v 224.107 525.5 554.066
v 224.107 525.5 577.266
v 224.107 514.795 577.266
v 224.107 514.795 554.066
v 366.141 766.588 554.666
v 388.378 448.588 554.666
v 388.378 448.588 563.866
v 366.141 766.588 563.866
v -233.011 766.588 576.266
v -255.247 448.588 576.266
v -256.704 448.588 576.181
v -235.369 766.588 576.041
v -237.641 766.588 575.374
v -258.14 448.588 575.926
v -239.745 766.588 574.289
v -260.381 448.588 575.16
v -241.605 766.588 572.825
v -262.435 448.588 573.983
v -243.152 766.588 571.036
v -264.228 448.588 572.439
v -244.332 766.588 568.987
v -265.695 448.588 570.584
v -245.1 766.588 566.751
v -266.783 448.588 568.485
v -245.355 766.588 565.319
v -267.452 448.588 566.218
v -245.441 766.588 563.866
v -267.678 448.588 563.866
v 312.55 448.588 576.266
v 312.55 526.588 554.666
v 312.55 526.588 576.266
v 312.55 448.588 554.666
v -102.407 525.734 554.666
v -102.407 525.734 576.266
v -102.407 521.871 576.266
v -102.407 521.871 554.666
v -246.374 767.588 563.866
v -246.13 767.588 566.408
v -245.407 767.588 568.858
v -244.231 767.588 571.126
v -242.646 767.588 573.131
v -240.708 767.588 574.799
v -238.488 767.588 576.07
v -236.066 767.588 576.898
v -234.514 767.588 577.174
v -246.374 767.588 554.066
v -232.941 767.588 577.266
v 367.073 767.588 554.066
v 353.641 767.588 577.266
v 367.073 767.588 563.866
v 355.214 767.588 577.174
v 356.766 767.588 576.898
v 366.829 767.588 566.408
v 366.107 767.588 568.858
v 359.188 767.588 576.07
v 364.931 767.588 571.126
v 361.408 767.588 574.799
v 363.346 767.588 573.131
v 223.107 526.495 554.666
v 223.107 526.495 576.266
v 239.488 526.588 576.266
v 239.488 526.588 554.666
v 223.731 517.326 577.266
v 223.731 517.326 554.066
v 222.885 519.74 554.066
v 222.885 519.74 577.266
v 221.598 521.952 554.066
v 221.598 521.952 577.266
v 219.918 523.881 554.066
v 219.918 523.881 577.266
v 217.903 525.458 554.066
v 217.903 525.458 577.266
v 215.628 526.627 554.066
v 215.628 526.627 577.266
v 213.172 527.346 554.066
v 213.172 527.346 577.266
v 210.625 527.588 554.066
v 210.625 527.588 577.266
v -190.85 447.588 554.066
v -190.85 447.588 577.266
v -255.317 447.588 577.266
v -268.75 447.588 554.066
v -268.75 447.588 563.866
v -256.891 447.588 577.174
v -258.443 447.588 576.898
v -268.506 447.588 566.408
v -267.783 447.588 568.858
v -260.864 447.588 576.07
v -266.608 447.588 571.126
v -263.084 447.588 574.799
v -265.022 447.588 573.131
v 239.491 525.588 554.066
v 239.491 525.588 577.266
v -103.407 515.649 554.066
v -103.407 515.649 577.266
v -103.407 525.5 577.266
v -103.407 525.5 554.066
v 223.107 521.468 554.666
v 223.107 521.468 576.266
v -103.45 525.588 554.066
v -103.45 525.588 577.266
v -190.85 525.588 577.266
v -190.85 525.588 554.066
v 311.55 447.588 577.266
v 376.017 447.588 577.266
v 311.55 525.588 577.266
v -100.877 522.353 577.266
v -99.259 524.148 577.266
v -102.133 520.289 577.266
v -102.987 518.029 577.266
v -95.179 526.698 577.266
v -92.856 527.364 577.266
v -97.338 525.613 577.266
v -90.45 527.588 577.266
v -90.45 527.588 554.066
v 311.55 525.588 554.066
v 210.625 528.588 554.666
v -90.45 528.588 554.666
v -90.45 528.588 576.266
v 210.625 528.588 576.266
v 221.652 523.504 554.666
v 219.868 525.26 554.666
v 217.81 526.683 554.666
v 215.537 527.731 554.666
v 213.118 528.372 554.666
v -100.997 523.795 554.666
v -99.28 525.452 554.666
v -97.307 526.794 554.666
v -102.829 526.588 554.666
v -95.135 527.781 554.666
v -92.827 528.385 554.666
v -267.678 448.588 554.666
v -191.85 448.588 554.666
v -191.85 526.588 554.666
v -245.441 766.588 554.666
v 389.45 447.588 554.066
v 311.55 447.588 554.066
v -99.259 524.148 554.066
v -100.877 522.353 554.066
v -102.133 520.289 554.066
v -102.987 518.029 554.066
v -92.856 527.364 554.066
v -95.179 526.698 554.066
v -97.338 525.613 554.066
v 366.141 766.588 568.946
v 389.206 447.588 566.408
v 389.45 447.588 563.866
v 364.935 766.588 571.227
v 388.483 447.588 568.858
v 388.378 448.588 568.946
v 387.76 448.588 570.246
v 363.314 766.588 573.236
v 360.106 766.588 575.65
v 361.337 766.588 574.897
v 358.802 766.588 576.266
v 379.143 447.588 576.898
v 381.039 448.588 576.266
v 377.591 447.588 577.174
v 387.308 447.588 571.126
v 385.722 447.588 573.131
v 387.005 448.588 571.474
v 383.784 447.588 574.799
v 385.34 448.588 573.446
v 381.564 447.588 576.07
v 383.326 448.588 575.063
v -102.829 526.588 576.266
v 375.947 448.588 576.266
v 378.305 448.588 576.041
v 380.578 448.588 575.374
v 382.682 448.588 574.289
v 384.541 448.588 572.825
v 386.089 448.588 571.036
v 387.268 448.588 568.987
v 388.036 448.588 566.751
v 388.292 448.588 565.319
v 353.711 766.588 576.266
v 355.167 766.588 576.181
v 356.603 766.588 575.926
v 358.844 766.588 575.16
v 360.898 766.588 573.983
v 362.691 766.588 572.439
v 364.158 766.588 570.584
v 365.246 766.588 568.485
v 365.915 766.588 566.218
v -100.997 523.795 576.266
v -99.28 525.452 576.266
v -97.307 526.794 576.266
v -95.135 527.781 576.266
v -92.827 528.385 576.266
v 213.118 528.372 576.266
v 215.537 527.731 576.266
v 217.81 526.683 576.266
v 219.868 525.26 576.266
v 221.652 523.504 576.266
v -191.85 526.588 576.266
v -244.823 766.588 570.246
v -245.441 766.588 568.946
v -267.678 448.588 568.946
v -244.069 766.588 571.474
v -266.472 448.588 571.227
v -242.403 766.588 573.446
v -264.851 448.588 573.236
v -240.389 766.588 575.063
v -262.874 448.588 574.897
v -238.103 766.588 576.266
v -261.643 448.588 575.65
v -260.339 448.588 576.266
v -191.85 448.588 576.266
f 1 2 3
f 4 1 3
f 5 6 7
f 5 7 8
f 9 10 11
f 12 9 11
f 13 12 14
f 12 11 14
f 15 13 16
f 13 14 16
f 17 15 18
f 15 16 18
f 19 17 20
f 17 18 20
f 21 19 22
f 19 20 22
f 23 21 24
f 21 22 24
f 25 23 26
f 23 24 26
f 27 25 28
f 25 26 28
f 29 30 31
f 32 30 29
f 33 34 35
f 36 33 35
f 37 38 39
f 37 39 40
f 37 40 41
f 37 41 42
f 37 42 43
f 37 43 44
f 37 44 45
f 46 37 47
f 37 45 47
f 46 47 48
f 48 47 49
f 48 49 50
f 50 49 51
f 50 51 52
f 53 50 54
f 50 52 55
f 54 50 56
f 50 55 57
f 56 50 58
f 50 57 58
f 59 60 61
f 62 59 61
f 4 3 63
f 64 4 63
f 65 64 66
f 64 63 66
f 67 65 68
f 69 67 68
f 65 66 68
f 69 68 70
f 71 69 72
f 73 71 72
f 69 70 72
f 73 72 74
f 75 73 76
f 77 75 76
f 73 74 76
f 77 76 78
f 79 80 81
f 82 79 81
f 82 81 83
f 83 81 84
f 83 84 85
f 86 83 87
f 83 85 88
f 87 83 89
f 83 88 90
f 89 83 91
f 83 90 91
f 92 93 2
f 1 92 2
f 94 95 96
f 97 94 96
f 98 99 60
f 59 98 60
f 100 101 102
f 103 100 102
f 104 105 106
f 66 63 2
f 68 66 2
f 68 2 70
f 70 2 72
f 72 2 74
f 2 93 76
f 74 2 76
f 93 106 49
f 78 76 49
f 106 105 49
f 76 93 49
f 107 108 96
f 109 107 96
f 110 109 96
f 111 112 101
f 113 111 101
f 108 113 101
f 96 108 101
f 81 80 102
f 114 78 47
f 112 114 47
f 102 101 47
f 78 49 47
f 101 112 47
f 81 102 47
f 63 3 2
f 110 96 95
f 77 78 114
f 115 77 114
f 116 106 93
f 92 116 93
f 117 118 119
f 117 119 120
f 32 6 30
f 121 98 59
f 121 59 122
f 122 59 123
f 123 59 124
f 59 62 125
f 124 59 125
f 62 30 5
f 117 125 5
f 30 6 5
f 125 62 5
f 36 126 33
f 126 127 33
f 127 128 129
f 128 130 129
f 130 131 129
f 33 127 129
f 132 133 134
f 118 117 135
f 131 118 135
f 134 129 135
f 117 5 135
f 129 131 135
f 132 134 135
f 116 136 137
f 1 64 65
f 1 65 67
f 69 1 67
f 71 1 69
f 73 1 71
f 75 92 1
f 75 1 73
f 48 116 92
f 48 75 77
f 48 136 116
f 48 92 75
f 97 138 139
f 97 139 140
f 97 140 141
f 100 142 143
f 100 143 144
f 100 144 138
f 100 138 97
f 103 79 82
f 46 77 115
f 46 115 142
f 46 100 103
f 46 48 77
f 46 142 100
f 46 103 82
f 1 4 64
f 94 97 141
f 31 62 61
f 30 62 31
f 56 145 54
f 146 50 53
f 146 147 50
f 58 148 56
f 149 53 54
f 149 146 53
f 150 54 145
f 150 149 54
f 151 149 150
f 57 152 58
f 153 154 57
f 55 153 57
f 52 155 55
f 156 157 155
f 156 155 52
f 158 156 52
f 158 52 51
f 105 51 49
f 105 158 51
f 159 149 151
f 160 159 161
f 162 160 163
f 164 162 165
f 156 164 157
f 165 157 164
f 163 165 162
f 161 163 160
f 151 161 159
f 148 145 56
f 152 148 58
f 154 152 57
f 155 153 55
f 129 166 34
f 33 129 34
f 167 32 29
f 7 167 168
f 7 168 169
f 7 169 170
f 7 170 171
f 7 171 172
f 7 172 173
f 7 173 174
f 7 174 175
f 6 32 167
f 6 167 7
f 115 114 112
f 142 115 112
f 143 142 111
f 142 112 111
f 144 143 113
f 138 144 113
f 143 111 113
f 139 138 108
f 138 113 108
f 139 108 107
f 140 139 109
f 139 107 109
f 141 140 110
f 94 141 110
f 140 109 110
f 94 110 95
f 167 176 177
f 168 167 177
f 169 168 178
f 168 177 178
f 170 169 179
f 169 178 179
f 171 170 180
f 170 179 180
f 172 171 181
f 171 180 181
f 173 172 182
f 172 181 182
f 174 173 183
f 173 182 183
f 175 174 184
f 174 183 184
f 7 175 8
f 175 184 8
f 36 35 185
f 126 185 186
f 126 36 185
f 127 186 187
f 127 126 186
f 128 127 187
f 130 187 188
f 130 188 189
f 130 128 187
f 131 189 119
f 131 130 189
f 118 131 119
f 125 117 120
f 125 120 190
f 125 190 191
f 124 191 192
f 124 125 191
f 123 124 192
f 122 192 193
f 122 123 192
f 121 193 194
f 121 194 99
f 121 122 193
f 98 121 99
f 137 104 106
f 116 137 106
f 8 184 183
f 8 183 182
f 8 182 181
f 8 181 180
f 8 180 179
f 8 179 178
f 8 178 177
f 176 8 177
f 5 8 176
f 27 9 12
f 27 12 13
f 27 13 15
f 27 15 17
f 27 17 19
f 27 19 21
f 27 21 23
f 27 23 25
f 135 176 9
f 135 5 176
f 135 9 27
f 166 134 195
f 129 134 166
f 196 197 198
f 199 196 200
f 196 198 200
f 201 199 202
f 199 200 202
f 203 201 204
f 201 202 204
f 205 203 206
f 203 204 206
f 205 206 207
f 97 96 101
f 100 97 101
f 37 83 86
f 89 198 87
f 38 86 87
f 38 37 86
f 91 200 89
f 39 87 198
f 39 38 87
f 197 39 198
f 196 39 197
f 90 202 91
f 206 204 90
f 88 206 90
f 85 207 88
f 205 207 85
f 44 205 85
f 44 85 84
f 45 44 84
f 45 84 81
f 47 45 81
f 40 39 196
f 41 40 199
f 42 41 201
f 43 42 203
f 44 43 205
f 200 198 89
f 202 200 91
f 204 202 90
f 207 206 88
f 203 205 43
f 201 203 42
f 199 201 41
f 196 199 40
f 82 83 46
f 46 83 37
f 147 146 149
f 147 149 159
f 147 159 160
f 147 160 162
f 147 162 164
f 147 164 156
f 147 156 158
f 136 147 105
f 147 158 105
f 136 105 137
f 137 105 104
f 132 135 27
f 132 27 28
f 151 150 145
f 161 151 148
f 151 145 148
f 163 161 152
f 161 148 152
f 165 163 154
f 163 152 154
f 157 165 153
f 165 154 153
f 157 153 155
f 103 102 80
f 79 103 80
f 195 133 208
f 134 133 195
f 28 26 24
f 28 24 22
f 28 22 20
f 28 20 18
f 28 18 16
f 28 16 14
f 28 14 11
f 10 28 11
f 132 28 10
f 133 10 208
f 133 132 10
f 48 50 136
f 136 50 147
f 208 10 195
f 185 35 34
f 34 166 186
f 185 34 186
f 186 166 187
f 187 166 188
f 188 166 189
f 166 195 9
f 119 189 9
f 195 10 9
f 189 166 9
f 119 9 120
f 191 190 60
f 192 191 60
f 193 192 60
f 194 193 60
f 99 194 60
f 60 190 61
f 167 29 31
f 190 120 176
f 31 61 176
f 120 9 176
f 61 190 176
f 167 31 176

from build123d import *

# Parameters (mm, degrees)
BOSS_EXTRUDE1_DEPTH = 23.2
FILLET1_R           = 13.4
SHELL1_START        = 554.066138639
SHELL1_DEPTH        = 22.2
SHELL1_START_2      = -740.047251584
SHELL1_2_DEPTH      = 319.643616058
SHELL1_START_3      = 428.823224764
SHELL1_3_DEPTH      = 319.643616058
BOSS_EXTRUDE2_START = -0.6
BOSS_EXTRUDE2_DEPTH = 0.6


with BuildPart() as part:
    # Sketch1 → Boss-Extrude1 (new body)
    with BuildSketch(Plane(origin=(0, 0, 577.266138639), x_dir=(-1, 0, 0), z_dir=(0, 0, -1))):
        with BuildLine():
            Line((246.373543052, 767.588219351), (232.840577428, 767.588219351))
            Line((232.840577428, 767.588219351), (221.373543052, 767.588219351))
            Line((221.373543052, 767.588219351), (-342.073297304, 767.588219351))
            Line((-342.073297304, 767.588219351), (-353.54033168, 767.588219351))
            Line((-353.54033168, 767.588219351), (-367.073297304, 767.588219351))
            Line((-367.073297304, 767.588219351), (-389.449877126, 447.588219351))
            Line((-389.449877126, 447.588219351), (-375.949877126, 447.588219351))
            Line((-375.949877126, 447.588219351), (-364.449877126, 447.588219351))
            Line((-364.449877126, 447.588219351), (-311.549877126, 447.588219351))
            Line((-311.549877126, 447.588219351), (-311.549877126, 525.588219351))
            Line((-311.549877126, 525.588219351), (-311.490727804, 525.588219351))
            Line((-311.490727804, 525.588219351), (-239.490727804, 525.588219351))
            Line((-239.490727804, 525.588219351), (-224.106525446, 525.500426272))
            Line((-224.106525446, 525.500426272), (-224.106525446, 514.79475476))
            ThreePointArc((-224.106525446, 514.79475476), (-219.917813499, 523.880773359), (-210.625026727, 527.588219351))
            Line((-210.625026727, 527.588219351), (90.450122874, 527.588219351))
            ThreePointArc((90.450122874, 527.588219351), (99.259487157, 524.148297851), (103.406771195, 515.649004109))
            Line((103.406771195, 515.649004109), (103.406771195, 525.500426272))
            Line((103.406771195, 525.500426272), (103.450122874, 525.588219351))
            Line((103.450122874, 525.588219351), (190.850122874, 525.588219351))
            Line((190.850122874, 525.588219351), (190.850122874, 447.588219351))
            Line((190.850122874, 447.588219351), (243.750122874, 447.588219351))
            Line((243.750122874, 447.588219351), (255.21715725, 447.588219351))
            Line((255.21715725, 447.588219351), (255.250122874, 447.588219351))
            Line((255.250122874, 447.588219351), (268.750122874, 447.588219351))
            Line((268.750122874, 447.588219351), (246.373543052, 767.588219351))
        make_face()
    extrude(amount=BOSS_EXTRUDE1_DEPTH)

    # Fillet1
    fillet1_edges = [part.edges().sort_by_distance(p)[0] for p in [
        (378.261587215, 607.588219351, 577.266138639),
        (-257.561832963, 607.588219351, 577.266138639),
    ]]
    fillet(fillet1_edges, radius=FILLET1_R)

    # Shell1: read off the stored shape, not the designer's step
    # Shell1 outline → Shell1 (cut)
    with BuildSketch(Plane.XY.offset(SHELL1_START)):
        with BuildLine():
            Line((-245.441027966, 766.588219351), (-267.677754164, 448.588219351))
            Line((-267.677754164, 448.588219351), (-191.850122874, 448.588219351))
            Line((-191.850122874, 448.588219351), (-191.850122874, 526.588219351))
            Line((-191.850122874, 526.588219351), (-102.828644378, 526.588219351))
            Line((-102.828644378, 526.588219351), (-102.406771195, 525.73386847))
            Line((-102.406771195, 525.73386847), (-102.406771195, 521.870977135))
            ThreePointArc((-102.406771195, 521.870977135), (-97.307286684, 526.793927216), (-90.450122874, 528.588219351))
            Line((-90.450122874, 528.588219351), (210.625026727, 528.588219351))
            ThreePointArc((210.625026727, 528.588219351), (217.80980826, 526.683016464), (223.106525446, 521.468069601))
            Line((223.106525446, 521.468069601), (223.106525446, 526.494735851))
            Line((223.106525446, 526.494735851), (239.487874476, 526.588219351))
            Line((239.487874476, 526.588219351), (312.549877126, 526.588219351))
            Line((312.549877126, 526.588219351), (312.549877126, 448.588219351))
            Line((312.549877126, 448.588219351), (388.377508416, 448.588219351))
            Line((388.377508416, 448.588219351), (366.140782218, 766.588219351))
            Line((366.140782218, 766.588219351), (-245.441027966, 766.588219351))
        make_face()
    extrude(amount=SHELL1_DEPTH, mode=Mode.SUBTRACT)

    # Shell1 2 outline → Shell1 2 (add)
    with BuildSketch(Plane(origin=(0, 0, 0), x_dir=(0.9975640502598233, 0.06975647374413793, 0), z_dir=(0.06975647374413793, -0.9975640502598234, 0)).offset(SHELL1_START_2)):
        with BuildLine():
            ThreePointArc((406.32337267, 576.266138639), (415.091496757, 572.634262726), (418.72337267, 563.866138639))
            Line((418.72337267, 563.866138639), (418.72337267, 568.945508678))
            ThreePointArc((418.72337267, 568.945508678), (415.798603538, 573.341369507), (411.40274271, 576.266138639))
            Line((411.40274271, 576.266138639), (406.32337267, 576.266138639))
        make_face()
    extrude(amount=SHELL1_2_DEPTH)

    # Shell1 3 outline → Shell1 3 (add)
    with BuildSketch(Plane(origin=(0, 0, 0), x_dir=(0.9975640502598233, -0.06975647374413843, 0), z_dir=(0.06975647374413843, 0.9975640502598233, 0)).offset(SHELL1_START_3)):
        with BuildLine():
            ThreePointArc((-285.917636954, -576.266138639), (-294.68576104, -572.634262725), (-298.317636954, -563.866138639))
            Line((-298.317636954, -563.866138639), (-298.317636953, -568.94550868))
            ThreePointArc((-298.317636953, -568.94550868), (-295.392867822, -573.341369507), (-290.997006994, -576.266138639))
            Line((-290.997006994, -576.266138639), (-285.917636954, -576.266138639))
        make_face()
    extrude(amount=SHELL1_3_DEPTH)

    # Sketch2 → Boss-Extrude2 (add)
    with BuildSketch(Plane(origin=(0, 0, 554.066138639), x_dir=(-1, 0, 0), z_dir=(0, 0, -1)).offset(BOSS_EXTRUDE2_START)):
        with BuildLine():
            Line((246.373543052, 767.588219351), (-367.073297304, 767.588219351))
            Line((-367.073297304, 767.588219351), (-389.449877126, 447.588219351))
            Line((-389.449877126, 447.588219351), (-311.549877126, 447.588219351))
            Line((-311.549877126, 447.588219351), (-311.549877126, 525.588219351))
            Line((-311.549877126, 525.588219351), (-311.312198799, 525.588219351))
            Line((-311.312198799, 525.588219351), (-239.490727804, 525.588219351))
            Line((-239.490727804, 525.588219351), (-224.106525446, 525.500426272))
            Line((-224.106525446, 525.500426272), (-224.106525446, 514.79475476))
            ThreePointArc((-224.106525446, 514.79475476), (-219.917813499, 523.880773359), (-210.625026727, 527.588219351))
            Line((-210.625026727, 527.588219351), (90.450122874, 527.588219351))
            ThreePointArc((90.450122874, 527.588219351), (99.259487157, 524.148297851), (103.406771195, 515.649004109))
            Line((103.406771195, 515.649004109), (103.406771195, 525.500426272))
            Line((103.406771195, 525.500426272), (103.450122874, 525.588219351))
            Line((103.450122874, 525.588219351), (190.612444548, 525.588219351))
            Line((190.612444548, 525.588219351), (190.850122874, 525.588219351))
            Line((190.850122874, 525.588219351), (190.850122874, 525.176548414))
            Line((190.850122874, 525.176548414), (190.850122874, 447.588219351))
            Line((190.850122874, 447.588219351), (268.750122874, 447.588219351))
            Line((268.750122874, 447.588219351), (246.373543052, 767.588219351))
        make_face()
    extrude(amount=BOSS_EXTRUDE2_DEPTH)


solid = part.part
